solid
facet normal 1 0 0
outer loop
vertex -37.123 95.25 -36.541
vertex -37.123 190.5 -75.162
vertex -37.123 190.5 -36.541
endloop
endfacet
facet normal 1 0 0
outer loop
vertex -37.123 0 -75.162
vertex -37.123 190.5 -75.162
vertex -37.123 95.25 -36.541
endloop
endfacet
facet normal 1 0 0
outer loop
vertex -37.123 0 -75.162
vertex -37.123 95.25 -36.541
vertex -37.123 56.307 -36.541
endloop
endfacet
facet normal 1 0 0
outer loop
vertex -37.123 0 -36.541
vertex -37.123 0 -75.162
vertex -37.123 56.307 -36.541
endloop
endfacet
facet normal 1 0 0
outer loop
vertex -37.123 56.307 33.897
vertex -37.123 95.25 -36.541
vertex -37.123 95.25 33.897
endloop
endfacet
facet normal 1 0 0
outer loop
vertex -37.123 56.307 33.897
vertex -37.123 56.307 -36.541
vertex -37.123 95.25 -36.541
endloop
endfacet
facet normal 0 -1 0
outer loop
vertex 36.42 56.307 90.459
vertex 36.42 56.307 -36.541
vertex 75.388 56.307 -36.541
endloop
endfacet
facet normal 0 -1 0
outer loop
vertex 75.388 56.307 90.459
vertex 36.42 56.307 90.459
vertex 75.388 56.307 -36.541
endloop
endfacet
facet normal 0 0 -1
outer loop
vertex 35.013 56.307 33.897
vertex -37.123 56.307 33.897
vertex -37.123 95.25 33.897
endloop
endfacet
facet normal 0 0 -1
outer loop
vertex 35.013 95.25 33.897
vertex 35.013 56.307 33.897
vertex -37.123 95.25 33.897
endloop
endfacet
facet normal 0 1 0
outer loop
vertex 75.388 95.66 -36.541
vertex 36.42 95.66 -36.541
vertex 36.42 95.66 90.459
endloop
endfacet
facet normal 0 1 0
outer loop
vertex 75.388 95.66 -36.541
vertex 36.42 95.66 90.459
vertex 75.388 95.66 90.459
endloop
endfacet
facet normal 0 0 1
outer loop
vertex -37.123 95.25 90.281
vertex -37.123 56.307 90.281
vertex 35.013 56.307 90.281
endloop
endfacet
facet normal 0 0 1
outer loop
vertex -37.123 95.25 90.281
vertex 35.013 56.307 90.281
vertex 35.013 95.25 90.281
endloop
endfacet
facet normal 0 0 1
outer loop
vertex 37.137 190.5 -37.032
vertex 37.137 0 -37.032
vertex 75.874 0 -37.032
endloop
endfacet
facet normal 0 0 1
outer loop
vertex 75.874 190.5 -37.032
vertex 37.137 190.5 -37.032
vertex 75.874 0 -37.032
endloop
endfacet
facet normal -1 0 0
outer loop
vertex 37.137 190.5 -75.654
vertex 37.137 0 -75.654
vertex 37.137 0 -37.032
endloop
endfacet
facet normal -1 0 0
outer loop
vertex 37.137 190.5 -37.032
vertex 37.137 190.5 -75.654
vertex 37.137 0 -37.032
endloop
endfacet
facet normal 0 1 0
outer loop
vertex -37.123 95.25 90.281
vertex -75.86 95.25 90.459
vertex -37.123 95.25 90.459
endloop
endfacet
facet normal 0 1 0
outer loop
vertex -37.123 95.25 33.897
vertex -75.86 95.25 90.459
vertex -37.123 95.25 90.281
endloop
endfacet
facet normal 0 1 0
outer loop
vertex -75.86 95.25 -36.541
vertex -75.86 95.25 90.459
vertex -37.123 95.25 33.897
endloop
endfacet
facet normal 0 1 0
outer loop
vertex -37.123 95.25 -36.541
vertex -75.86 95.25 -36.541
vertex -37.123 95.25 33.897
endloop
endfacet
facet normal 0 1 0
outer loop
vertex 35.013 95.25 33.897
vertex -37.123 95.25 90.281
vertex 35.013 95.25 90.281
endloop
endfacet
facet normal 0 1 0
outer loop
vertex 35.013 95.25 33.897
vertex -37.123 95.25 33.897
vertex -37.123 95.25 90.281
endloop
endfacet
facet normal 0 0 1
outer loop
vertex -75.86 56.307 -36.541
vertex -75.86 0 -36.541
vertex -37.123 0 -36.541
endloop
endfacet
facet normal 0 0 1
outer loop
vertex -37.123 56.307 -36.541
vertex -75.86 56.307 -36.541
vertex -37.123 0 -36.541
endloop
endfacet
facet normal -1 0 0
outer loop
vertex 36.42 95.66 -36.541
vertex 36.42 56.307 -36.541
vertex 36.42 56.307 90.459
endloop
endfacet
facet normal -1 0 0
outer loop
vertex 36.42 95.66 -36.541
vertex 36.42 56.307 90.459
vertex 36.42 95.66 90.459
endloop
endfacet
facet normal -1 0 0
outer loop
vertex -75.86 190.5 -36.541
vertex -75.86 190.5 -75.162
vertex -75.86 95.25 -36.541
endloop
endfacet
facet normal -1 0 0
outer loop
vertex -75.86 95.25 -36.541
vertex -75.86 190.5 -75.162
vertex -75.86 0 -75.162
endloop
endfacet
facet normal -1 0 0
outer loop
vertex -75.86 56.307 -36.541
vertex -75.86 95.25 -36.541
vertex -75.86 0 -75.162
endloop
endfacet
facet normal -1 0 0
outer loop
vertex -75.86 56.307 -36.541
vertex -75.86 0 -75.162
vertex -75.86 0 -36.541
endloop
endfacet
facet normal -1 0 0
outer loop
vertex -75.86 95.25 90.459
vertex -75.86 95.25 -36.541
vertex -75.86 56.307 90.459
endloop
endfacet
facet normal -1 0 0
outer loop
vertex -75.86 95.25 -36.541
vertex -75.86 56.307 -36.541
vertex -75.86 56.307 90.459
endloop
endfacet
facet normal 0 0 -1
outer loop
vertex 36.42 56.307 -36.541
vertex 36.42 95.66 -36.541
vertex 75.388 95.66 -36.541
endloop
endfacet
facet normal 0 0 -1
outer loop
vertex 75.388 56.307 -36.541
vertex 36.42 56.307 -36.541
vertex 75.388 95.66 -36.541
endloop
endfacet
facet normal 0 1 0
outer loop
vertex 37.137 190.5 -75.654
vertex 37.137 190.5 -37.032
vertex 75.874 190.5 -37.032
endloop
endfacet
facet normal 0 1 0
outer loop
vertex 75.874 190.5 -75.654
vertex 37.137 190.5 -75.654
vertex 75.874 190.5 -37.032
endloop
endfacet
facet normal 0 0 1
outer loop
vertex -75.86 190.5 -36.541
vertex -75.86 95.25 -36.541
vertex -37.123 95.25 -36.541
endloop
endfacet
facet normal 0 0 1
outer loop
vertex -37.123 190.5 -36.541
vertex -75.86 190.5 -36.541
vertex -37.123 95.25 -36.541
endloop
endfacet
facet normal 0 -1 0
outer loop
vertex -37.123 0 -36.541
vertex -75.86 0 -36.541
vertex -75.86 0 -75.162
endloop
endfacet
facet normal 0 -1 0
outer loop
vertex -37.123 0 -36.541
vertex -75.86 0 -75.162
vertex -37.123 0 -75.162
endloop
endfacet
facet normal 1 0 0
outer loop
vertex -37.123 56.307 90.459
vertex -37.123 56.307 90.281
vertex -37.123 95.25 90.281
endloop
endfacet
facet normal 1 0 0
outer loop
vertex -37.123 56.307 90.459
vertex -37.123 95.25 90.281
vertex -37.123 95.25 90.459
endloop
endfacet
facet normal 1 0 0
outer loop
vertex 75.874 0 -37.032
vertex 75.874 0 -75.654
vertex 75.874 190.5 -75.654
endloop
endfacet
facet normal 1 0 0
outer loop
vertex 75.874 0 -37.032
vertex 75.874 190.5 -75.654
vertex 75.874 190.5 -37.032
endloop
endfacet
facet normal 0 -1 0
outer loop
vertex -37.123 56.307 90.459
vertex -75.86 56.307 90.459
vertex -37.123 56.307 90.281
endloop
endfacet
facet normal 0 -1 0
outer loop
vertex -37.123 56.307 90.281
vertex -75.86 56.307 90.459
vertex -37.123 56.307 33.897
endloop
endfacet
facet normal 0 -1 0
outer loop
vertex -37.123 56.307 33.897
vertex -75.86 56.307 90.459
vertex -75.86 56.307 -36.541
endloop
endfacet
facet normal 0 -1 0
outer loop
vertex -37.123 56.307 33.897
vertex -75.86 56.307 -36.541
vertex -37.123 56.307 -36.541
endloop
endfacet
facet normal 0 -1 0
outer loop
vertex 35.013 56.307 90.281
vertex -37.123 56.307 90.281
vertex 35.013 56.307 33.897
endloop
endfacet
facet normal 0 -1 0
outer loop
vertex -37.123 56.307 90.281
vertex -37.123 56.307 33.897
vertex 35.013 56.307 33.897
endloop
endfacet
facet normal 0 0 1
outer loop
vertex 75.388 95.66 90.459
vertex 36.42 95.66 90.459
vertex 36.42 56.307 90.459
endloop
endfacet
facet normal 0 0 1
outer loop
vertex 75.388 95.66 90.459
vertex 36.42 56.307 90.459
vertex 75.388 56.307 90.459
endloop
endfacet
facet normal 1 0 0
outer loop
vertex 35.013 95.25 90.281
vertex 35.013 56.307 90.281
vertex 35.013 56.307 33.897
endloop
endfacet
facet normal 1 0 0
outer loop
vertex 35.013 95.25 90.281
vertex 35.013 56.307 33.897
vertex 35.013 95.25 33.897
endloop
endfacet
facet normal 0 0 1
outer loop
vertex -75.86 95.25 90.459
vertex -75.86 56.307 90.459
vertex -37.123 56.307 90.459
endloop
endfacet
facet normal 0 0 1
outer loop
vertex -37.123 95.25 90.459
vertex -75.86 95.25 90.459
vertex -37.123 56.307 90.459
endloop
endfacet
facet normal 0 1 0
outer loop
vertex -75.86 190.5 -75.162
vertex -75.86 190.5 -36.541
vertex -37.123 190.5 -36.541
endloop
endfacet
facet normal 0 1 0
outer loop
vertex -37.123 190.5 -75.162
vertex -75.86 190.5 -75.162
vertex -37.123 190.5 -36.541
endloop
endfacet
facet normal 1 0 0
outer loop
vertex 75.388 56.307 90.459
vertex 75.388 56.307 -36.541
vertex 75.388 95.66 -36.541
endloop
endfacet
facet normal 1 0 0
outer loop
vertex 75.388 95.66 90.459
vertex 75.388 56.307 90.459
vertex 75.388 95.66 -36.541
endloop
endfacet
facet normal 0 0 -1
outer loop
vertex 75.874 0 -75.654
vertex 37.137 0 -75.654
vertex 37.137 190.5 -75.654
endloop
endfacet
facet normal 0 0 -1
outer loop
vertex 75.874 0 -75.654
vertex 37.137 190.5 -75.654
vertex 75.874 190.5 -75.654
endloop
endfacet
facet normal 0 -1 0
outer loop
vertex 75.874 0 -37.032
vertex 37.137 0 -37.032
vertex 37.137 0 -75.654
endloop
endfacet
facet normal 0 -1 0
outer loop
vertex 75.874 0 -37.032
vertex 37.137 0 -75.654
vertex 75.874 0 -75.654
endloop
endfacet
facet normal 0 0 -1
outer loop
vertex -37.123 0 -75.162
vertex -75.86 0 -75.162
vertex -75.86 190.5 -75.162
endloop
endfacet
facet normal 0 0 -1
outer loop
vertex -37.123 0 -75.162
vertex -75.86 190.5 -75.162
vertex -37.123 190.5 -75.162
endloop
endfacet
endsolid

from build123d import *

# Parameters (mm, degrees)
F0_W     = 38.7370586395
F0_H     = 38.6211834848
F1_DEPTH = 190.5
F2_W     = 38.7370586395
F2_H     = 38.943369627
F3_DEPTH = 127
F2_W_2   = 38.9677062631
F2_H_2   = 39.3535867333
F5_W     = 38.943369627
F5_H     = 56.383498013
F6_DEPTH = 72.136


with BuildPart() as f1:
    # F0 (on Front) → F1 (new body)
    with BuildSketch(Plane.XZ):
        with Locations((-56.4915388823, -55.8517817408)):
            Rectangle(F0_W, F0_H)
    extrude(amount=-F1_DEPTH)

    # F2 (on face) → F3 (join)
    with BuildSketch(Plane.XY.offset(-36.5411899984)):
        with Locations((-56.4915388823, 75.7783151865)):
            Rectangle(F2_W, F2_H)
    extrude(amount=F3_DEPTH)

    # F5 (on face) → F6 (join)
    with BuildSketch(Plane.YZ.offset(-37.1230095625)):
        with Locations((75.7783151865, 62.0889104903)):
            Rectangle(F5_W, F5_H)
    extrude(amount=F6_DEPTH)


with BuildPart() as f1b:
    # F0 (on Front) → F1, piece 2 (new body)
    with BuildSketch(Plane.XZ):
        with Locations((56.5054193139, -56.3429240137)):
            Rectangle(F0_W, F0_H)
    extrude(amount=-F1_DEPTH)


with BuildPart() as f3:
    # F2 (on face) → F3, piece 2 (new body)
    with BuildSketch(Plane.XY.offset(-36.5411899984)):
        with Locations((55.9038706124, 75.9834237397)):
            Rectangle(F2_W_2, F2_H_2)
    extrude(amount=F3_DEPTH)


solid = Compound([f1.part, f1b.part, f3.part])
